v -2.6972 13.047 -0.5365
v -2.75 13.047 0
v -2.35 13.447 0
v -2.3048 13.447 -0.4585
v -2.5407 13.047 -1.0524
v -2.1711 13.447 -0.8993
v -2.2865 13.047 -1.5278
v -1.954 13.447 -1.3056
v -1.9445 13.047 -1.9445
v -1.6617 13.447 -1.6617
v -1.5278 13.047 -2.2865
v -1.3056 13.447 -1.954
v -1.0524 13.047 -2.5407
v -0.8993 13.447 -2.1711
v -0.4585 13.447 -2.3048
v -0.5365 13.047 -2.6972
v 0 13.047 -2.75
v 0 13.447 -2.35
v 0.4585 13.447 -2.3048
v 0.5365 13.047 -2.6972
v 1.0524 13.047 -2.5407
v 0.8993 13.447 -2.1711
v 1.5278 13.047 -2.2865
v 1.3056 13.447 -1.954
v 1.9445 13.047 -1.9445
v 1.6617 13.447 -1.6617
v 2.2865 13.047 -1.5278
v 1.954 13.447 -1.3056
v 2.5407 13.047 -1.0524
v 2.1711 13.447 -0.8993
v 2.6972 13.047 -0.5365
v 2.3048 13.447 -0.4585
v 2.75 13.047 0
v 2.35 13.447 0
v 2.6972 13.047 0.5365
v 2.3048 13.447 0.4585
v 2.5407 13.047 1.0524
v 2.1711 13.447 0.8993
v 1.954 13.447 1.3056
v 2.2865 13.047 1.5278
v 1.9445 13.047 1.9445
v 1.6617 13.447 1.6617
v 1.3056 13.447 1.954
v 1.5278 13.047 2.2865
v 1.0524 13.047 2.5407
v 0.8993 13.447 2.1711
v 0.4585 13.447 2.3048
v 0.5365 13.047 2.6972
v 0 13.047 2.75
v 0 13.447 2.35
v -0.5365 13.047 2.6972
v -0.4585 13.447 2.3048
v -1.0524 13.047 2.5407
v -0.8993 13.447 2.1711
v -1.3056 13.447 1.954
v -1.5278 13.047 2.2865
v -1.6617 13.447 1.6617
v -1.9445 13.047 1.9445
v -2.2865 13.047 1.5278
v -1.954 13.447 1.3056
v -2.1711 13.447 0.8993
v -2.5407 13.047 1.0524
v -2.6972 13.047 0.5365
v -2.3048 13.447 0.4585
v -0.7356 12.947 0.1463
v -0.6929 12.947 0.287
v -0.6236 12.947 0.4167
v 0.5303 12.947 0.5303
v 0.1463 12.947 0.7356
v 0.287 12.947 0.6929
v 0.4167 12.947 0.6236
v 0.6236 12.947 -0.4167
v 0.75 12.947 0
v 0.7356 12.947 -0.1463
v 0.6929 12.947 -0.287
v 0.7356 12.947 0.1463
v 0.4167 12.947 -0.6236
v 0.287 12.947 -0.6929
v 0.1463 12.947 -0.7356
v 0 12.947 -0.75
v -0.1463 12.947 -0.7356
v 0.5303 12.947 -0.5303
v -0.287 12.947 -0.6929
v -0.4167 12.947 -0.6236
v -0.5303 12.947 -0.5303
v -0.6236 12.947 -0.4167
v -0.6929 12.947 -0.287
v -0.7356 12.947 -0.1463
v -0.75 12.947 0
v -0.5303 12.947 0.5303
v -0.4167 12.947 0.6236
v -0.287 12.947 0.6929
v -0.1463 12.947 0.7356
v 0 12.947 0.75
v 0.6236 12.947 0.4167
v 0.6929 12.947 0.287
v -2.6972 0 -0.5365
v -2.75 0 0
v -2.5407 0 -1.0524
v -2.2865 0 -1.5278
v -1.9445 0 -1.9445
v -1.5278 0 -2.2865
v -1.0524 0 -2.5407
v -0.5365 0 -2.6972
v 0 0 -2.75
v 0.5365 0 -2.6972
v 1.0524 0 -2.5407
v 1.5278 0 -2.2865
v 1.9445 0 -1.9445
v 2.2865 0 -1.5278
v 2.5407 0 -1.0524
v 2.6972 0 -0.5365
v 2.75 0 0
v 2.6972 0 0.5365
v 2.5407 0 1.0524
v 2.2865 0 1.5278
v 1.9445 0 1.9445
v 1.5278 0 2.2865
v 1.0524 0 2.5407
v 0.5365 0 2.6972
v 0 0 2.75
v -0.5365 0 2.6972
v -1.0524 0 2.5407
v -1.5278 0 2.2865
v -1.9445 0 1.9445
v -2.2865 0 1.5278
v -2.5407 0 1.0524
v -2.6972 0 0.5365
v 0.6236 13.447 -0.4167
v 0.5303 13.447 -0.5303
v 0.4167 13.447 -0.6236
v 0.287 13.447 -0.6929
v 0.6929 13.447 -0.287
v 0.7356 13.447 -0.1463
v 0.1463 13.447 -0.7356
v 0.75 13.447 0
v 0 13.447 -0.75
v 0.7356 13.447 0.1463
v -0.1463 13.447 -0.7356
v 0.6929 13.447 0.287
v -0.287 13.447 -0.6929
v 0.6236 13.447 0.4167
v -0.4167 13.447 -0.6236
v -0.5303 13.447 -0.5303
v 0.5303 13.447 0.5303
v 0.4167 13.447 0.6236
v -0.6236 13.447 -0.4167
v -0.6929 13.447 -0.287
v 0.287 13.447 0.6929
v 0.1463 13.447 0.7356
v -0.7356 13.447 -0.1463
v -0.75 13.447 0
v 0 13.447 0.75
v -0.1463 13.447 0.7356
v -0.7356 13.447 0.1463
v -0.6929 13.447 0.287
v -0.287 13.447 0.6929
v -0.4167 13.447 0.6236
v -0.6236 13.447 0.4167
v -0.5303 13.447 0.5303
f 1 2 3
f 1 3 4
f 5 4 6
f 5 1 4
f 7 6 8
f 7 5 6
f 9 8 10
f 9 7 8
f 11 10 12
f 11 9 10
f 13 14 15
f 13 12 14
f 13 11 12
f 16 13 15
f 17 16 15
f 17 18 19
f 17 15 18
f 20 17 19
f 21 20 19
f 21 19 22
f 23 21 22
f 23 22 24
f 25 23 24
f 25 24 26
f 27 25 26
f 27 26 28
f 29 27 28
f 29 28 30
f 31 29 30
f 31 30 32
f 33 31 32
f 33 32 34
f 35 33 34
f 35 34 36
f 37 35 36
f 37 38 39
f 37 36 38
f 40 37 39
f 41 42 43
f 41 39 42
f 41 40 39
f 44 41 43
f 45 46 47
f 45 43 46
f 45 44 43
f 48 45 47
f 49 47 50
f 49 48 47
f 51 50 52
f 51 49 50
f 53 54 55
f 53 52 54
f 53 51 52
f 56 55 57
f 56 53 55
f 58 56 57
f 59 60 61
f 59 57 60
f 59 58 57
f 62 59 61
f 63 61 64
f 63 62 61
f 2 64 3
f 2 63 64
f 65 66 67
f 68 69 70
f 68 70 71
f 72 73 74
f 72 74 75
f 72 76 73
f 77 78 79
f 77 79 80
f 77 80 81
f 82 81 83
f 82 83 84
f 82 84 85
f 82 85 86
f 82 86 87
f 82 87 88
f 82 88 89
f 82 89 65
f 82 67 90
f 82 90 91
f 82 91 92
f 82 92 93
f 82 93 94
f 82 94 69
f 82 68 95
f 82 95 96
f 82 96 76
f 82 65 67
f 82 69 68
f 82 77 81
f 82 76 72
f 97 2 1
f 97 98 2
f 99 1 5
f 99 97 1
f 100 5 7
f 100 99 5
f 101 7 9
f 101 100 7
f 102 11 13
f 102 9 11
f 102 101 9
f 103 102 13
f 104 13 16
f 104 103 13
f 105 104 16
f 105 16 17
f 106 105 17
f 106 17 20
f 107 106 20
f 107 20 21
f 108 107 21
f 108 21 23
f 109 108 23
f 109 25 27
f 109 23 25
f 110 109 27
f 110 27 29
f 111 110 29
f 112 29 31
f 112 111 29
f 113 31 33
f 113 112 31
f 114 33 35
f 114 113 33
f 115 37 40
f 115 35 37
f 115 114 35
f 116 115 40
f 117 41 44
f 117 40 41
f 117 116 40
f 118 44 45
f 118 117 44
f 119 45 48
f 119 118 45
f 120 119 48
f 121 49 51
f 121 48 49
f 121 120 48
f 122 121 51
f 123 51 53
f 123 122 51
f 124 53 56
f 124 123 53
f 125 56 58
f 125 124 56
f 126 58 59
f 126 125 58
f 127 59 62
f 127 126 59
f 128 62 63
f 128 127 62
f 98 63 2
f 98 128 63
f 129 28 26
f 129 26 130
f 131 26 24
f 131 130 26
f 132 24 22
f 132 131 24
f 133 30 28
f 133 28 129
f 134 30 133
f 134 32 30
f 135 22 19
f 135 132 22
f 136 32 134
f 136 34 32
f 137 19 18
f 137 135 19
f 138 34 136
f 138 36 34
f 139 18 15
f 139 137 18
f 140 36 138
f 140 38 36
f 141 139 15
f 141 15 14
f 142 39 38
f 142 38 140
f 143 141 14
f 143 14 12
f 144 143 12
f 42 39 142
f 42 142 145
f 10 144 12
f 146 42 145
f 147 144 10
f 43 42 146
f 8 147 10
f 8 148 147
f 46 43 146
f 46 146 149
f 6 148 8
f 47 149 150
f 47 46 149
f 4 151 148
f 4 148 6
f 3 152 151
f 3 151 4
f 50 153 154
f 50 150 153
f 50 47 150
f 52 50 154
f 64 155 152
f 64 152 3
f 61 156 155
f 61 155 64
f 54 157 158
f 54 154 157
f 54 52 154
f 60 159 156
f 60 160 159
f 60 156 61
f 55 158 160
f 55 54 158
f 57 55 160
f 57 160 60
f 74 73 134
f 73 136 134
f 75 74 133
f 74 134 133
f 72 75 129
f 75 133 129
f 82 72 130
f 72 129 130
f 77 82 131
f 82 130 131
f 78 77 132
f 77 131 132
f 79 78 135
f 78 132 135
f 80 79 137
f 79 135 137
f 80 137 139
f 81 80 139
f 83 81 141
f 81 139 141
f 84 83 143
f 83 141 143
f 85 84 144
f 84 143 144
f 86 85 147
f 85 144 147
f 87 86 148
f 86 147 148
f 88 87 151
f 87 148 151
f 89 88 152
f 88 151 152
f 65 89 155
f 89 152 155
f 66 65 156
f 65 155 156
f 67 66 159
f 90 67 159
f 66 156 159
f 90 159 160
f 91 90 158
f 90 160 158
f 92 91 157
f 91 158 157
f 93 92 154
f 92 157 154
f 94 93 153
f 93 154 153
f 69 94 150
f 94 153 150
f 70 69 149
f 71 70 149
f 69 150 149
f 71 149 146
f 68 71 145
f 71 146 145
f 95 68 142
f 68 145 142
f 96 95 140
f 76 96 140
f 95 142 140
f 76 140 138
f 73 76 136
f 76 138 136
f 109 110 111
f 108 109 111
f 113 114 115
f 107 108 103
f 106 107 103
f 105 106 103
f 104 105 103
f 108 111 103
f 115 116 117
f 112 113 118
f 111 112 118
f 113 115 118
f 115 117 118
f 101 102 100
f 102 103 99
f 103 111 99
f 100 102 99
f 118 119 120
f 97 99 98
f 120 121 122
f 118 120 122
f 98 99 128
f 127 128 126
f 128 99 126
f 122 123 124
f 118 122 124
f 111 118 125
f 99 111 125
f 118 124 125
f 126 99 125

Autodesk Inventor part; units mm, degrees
ref_plane "YZ Plane" through (0, 0, 0) normal (1, 0, 0) x (0, 1, 0)
ref_plane "XZ Plane" through (0, 0, 0) normal (0, 1, 0) x (-1, 0, 0)
ref_plane "XY Plane" through (0, 0, 0) normal (0, 0, 1) x (1, 0, 0)
sketch "Sketch1" plane through (0, 0, 0) normal (0, 1, 0) x (-1, 0, 0)
  circle A0 centre (0, 0) radius 2.75
  dimension "d0" = 5.5
extrude "Extrusion1" add sketch "Sketch1" along normal blind 13.447
chamfer "Chamfer1" distance 0.4 angle 45 1 edges at (2.75, 13.447, 0)
sketch "Sketch2" plane through (0, 13.447, 0) normal (0, 1, 0) x (1, 0, 0)
  circle A0 centre (0, 0) radius 2.35 projected
  circle A1 centre (0, 0) radius 0.75
  dimension "d6" = 1.5
extrude "Extrusion2" cut sketch "Sketch2" against normal blind 0.5 contours A1
properties part number "controller_push_button" material "ABS Plastic"
